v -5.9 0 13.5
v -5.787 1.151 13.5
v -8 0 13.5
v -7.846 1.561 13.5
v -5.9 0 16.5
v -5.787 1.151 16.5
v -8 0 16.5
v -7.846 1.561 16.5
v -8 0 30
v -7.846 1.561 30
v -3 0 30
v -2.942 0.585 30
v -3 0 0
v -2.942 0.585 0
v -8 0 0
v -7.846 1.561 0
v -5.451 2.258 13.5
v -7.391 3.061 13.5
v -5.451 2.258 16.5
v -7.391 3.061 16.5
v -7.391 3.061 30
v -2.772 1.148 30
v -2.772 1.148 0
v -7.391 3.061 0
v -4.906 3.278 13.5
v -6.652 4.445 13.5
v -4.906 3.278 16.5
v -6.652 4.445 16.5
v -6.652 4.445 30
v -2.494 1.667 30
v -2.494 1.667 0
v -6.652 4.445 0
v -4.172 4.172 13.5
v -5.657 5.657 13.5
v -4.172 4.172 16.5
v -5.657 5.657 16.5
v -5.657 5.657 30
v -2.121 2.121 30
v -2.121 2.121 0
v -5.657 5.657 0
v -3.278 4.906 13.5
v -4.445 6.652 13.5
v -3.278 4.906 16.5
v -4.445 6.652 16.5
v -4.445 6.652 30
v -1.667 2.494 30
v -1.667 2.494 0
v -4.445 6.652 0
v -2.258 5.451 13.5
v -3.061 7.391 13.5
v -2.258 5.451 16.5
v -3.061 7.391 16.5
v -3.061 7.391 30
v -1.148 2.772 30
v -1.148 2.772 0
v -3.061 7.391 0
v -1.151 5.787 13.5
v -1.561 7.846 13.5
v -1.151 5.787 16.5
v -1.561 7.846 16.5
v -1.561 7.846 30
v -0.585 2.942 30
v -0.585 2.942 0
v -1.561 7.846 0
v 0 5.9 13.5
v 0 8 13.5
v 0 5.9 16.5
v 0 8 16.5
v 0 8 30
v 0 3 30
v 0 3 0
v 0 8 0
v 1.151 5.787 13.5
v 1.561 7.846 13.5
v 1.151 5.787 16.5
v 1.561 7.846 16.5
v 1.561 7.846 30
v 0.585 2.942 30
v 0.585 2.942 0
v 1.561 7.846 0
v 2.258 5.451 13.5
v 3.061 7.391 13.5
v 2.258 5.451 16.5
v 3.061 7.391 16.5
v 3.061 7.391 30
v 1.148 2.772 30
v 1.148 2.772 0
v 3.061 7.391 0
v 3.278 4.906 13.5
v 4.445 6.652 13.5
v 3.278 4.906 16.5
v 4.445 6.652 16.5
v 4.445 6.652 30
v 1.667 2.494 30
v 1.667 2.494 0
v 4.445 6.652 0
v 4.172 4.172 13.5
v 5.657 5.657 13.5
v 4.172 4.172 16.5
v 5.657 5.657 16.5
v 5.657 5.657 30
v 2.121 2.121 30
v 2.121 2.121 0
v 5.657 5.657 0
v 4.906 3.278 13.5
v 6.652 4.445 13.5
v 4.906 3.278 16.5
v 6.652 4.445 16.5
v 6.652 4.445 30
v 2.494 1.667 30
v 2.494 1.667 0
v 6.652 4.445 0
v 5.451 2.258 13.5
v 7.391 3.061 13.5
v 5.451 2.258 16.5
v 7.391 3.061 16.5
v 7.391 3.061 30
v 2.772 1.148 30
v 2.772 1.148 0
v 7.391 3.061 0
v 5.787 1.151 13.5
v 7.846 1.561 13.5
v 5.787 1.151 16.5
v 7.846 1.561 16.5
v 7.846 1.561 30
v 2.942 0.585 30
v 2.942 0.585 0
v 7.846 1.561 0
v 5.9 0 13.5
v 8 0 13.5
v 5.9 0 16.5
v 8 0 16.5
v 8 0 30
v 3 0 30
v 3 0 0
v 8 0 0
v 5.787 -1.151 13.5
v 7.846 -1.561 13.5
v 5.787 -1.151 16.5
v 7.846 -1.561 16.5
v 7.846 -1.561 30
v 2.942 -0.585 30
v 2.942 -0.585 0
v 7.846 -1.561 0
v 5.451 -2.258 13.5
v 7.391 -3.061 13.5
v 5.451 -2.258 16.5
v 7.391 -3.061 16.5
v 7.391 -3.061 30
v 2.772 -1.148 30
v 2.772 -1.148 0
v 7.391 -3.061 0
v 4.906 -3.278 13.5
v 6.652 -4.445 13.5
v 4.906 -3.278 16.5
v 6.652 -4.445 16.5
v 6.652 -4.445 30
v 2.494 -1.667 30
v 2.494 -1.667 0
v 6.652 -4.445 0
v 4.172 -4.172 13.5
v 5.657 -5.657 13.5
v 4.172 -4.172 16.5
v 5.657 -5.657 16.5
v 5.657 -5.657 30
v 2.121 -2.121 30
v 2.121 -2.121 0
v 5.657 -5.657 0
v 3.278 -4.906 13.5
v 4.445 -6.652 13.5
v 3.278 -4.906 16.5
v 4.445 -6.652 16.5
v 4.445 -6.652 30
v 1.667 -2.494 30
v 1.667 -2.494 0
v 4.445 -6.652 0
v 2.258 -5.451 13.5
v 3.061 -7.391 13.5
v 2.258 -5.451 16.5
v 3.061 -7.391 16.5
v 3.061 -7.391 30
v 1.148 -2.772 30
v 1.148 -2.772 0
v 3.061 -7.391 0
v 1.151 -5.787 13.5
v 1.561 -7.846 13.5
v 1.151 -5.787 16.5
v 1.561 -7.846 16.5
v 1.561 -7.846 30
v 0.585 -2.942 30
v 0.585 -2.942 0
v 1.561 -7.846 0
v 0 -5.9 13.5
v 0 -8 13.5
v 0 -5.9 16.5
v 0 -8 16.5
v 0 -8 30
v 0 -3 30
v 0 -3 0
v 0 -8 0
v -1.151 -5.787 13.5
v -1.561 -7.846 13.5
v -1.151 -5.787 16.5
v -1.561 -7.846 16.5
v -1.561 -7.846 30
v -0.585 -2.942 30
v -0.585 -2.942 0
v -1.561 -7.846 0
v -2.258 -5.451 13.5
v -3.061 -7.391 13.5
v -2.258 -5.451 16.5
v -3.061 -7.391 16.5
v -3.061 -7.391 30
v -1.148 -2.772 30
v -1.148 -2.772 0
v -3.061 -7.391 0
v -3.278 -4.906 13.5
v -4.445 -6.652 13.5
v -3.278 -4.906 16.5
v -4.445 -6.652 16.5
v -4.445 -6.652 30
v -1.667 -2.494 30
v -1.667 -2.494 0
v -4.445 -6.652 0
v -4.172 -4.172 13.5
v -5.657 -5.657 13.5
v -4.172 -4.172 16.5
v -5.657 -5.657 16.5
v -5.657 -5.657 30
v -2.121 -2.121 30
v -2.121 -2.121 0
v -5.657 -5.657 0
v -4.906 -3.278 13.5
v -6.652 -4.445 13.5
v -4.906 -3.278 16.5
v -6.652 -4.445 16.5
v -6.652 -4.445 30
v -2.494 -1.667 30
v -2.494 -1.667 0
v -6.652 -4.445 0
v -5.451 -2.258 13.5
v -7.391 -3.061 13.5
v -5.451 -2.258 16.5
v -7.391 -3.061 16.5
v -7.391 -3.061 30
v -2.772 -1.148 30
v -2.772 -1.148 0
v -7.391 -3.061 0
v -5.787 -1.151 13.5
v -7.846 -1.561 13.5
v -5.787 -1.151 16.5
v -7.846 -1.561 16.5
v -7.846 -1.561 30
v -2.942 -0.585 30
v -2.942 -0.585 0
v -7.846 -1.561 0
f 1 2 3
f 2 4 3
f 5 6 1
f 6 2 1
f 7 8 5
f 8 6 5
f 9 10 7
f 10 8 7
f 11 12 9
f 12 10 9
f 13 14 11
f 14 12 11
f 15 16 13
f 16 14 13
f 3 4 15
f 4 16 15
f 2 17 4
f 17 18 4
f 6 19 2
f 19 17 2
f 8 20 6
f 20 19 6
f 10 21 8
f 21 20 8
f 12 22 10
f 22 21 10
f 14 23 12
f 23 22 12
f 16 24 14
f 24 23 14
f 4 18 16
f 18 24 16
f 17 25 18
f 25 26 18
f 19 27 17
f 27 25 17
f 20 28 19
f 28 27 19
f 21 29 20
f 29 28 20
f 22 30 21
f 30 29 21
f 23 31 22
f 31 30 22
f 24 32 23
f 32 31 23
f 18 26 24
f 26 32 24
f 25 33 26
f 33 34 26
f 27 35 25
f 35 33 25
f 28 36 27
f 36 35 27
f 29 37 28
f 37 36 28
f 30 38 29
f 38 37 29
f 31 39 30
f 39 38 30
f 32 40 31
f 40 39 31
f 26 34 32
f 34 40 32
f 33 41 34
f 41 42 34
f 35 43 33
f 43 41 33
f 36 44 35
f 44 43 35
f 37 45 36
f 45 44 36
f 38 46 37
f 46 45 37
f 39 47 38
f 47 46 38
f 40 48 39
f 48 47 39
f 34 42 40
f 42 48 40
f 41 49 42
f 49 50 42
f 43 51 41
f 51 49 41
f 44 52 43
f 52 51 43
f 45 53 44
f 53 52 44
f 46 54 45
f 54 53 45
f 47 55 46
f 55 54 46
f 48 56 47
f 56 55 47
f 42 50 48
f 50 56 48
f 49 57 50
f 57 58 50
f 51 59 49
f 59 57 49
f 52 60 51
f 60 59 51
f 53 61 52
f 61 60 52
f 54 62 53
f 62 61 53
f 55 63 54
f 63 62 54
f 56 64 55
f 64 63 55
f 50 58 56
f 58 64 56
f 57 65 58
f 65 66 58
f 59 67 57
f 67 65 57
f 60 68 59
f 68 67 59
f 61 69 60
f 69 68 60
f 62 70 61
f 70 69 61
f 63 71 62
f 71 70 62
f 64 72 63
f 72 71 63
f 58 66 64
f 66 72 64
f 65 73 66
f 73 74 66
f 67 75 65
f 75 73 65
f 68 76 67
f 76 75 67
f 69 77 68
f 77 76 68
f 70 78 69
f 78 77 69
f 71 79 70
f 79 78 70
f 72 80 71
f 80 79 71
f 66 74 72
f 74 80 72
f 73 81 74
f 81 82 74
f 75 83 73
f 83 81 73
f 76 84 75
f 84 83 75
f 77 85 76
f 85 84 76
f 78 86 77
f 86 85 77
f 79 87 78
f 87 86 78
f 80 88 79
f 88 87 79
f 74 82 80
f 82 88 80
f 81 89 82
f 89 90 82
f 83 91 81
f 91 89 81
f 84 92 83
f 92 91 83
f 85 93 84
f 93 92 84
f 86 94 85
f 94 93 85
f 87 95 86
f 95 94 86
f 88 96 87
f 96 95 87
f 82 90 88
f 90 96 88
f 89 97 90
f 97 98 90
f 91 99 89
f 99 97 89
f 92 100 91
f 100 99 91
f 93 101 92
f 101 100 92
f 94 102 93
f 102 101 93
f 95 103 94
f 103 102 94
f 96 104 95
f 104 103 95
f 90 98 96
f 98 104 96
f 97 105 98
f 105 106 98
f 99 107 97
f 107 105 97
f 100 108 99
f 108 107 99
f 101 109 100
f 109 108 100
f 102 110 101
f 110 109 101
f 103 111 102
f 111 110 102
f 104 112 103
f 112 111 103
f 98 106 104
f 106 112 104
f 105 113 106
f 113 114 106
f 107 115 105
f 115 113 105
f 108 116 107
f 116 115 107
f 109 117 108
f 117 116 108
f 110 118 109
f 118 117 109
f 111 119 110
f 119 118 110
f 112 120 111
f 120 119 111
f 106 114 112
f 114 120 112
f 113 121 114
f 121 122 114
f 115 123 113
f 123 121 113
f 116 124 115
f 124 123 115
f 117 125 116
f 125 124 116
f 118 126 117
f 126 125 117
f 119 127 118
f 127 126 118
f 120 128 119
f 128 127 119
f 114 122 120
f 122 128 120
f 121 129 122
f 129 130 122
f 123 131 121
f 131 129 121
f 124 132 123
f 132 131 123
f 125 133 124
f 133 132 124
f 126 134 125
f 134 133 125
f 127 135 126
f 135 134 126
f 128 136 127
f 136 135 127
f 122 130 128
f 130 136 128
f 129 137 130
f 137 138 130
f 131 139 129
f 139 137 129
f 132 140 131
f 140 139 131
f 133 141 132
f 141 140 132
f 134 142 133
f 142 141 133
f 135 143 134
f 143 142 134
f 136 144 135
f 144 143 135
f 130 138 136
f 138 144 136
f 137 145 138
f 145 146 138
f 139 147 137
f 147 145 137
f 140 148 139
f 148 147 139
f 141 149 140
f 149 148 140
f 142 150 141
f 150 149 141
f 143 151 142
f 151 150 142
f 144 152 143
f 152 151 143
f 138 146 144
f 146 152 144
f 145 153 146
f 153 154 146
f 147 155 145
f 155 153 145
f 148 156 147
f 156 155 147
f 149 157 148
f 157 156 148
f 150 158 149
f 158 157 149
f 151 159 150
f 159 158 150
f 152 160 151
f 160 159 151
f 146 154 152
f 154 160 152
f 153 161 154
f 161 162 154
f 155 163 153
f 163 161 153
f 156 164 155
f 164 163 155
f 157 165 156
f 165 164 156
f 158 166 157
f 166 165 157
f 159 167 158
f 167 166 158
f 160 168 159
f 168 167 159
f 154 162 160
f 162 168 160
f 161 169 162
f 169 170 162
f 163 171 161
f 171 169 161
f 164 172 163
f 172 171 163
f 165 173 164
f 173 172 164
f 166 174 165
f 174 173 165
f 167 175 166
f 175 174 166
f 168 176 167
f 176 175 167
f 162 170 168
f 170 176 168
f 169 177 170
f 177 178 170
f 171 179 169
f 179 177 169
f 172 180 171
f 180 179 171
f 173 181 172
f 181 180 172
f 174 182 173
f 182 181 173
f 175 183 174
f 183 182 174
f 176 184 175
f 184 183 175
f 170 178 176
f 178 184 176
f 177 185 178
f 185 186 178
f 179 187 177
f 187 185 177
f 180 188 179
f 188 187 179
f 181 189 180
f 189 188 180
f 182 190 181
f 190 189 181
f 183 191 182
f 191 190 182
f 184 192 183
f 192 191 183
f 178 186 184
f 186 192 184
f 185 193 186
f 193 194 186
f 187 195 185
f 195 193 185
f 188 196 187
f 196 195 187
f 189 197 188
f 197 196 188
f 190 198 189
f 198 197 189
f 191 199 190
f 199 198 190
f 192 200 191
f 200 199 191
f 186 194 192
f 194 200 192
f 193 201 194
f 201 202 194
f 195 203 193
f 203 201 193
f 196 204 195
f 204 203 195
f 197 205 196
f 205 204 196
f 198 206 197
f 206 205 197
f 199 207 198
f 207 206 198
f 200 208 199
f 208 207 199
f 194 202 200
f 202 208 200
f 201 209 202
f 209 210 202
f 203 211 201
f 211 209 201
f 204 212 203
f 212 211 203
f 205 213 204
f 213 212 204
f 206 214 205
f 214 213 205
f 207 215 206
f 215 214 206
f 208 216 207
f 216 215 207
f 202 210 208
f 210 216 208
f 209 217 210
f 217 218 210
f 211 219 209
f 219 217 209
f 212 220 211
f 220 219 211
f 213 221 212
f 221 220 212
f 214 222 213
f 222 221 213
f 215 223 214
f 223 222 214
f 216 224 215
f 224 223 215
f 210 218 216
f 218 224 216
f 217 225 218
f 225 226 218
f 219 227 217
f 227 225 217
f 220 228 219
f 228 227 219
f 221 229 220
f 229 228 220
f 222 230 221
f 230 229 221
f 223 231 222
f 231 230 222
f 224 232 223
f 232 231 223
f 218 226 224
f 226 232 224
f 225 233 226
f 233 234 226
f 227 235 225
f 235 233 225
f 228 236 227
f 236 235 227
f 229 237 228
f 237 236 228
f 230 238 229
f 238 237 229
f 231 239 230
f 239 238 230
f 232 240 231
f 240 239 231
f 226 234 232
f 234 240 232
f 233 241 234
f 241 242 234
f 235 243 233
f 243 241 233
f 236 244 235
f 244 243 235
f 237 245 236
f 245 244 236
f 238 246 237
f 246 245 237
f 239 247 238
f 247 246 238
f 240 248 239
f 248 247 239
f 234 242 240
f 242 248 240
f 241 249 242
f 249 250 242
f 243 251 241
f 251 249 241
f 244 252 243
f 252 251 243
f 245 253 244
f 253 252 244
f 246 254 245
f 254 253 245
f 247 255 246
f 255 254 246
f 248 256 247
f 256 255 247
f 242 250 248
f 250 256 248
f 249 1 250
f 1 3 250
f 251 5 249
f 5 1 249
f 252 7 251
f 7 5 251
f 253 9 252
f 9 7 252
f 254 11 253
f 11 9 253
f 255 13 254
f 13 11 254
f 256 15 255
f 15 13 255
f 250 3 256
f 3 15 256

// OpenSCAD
$fn = 32;

// ----------------------------------------------------------------------
// Grooved revolve: stepped, bore R3
// ----------------------------------------------------------------------

// --- parameters (mm) ---
bore_r = 3;               // bore radius
outer_r = 8;              // outer radius of the body
total_h = 30;             // overall height, Z
wall = 5;                 // radial wall thickness
groove_w = 3;             // groove width
groove_d = 2.1;           // groove depth
grooves = 1;              // number of outer grooves
fit_tol = 0.1;            // declared fit tolerance (prompt contract)
free_tol = 0.3;           // declared free tolerance (prompt contract)

bbox_x = 2 * outer_r;  // full diameter
bore_d = 2 * bore_r;  // bore diameter
body_d = 2 * outer_r;  // body diameter
revolve_angle = 360;  // full turn around the Z axis

profile = [[3, 0], [8, 0], [8, 13.5], [5.9, 13.5], [5.9, 16.5], [8, 16.5], [8, 30], [3, 30]];  // primary outline, 8 points, counter clockwise

// --- the one profile operation ---
rotate_extrude(angle = revolve_angle) polygon(points = profile);
